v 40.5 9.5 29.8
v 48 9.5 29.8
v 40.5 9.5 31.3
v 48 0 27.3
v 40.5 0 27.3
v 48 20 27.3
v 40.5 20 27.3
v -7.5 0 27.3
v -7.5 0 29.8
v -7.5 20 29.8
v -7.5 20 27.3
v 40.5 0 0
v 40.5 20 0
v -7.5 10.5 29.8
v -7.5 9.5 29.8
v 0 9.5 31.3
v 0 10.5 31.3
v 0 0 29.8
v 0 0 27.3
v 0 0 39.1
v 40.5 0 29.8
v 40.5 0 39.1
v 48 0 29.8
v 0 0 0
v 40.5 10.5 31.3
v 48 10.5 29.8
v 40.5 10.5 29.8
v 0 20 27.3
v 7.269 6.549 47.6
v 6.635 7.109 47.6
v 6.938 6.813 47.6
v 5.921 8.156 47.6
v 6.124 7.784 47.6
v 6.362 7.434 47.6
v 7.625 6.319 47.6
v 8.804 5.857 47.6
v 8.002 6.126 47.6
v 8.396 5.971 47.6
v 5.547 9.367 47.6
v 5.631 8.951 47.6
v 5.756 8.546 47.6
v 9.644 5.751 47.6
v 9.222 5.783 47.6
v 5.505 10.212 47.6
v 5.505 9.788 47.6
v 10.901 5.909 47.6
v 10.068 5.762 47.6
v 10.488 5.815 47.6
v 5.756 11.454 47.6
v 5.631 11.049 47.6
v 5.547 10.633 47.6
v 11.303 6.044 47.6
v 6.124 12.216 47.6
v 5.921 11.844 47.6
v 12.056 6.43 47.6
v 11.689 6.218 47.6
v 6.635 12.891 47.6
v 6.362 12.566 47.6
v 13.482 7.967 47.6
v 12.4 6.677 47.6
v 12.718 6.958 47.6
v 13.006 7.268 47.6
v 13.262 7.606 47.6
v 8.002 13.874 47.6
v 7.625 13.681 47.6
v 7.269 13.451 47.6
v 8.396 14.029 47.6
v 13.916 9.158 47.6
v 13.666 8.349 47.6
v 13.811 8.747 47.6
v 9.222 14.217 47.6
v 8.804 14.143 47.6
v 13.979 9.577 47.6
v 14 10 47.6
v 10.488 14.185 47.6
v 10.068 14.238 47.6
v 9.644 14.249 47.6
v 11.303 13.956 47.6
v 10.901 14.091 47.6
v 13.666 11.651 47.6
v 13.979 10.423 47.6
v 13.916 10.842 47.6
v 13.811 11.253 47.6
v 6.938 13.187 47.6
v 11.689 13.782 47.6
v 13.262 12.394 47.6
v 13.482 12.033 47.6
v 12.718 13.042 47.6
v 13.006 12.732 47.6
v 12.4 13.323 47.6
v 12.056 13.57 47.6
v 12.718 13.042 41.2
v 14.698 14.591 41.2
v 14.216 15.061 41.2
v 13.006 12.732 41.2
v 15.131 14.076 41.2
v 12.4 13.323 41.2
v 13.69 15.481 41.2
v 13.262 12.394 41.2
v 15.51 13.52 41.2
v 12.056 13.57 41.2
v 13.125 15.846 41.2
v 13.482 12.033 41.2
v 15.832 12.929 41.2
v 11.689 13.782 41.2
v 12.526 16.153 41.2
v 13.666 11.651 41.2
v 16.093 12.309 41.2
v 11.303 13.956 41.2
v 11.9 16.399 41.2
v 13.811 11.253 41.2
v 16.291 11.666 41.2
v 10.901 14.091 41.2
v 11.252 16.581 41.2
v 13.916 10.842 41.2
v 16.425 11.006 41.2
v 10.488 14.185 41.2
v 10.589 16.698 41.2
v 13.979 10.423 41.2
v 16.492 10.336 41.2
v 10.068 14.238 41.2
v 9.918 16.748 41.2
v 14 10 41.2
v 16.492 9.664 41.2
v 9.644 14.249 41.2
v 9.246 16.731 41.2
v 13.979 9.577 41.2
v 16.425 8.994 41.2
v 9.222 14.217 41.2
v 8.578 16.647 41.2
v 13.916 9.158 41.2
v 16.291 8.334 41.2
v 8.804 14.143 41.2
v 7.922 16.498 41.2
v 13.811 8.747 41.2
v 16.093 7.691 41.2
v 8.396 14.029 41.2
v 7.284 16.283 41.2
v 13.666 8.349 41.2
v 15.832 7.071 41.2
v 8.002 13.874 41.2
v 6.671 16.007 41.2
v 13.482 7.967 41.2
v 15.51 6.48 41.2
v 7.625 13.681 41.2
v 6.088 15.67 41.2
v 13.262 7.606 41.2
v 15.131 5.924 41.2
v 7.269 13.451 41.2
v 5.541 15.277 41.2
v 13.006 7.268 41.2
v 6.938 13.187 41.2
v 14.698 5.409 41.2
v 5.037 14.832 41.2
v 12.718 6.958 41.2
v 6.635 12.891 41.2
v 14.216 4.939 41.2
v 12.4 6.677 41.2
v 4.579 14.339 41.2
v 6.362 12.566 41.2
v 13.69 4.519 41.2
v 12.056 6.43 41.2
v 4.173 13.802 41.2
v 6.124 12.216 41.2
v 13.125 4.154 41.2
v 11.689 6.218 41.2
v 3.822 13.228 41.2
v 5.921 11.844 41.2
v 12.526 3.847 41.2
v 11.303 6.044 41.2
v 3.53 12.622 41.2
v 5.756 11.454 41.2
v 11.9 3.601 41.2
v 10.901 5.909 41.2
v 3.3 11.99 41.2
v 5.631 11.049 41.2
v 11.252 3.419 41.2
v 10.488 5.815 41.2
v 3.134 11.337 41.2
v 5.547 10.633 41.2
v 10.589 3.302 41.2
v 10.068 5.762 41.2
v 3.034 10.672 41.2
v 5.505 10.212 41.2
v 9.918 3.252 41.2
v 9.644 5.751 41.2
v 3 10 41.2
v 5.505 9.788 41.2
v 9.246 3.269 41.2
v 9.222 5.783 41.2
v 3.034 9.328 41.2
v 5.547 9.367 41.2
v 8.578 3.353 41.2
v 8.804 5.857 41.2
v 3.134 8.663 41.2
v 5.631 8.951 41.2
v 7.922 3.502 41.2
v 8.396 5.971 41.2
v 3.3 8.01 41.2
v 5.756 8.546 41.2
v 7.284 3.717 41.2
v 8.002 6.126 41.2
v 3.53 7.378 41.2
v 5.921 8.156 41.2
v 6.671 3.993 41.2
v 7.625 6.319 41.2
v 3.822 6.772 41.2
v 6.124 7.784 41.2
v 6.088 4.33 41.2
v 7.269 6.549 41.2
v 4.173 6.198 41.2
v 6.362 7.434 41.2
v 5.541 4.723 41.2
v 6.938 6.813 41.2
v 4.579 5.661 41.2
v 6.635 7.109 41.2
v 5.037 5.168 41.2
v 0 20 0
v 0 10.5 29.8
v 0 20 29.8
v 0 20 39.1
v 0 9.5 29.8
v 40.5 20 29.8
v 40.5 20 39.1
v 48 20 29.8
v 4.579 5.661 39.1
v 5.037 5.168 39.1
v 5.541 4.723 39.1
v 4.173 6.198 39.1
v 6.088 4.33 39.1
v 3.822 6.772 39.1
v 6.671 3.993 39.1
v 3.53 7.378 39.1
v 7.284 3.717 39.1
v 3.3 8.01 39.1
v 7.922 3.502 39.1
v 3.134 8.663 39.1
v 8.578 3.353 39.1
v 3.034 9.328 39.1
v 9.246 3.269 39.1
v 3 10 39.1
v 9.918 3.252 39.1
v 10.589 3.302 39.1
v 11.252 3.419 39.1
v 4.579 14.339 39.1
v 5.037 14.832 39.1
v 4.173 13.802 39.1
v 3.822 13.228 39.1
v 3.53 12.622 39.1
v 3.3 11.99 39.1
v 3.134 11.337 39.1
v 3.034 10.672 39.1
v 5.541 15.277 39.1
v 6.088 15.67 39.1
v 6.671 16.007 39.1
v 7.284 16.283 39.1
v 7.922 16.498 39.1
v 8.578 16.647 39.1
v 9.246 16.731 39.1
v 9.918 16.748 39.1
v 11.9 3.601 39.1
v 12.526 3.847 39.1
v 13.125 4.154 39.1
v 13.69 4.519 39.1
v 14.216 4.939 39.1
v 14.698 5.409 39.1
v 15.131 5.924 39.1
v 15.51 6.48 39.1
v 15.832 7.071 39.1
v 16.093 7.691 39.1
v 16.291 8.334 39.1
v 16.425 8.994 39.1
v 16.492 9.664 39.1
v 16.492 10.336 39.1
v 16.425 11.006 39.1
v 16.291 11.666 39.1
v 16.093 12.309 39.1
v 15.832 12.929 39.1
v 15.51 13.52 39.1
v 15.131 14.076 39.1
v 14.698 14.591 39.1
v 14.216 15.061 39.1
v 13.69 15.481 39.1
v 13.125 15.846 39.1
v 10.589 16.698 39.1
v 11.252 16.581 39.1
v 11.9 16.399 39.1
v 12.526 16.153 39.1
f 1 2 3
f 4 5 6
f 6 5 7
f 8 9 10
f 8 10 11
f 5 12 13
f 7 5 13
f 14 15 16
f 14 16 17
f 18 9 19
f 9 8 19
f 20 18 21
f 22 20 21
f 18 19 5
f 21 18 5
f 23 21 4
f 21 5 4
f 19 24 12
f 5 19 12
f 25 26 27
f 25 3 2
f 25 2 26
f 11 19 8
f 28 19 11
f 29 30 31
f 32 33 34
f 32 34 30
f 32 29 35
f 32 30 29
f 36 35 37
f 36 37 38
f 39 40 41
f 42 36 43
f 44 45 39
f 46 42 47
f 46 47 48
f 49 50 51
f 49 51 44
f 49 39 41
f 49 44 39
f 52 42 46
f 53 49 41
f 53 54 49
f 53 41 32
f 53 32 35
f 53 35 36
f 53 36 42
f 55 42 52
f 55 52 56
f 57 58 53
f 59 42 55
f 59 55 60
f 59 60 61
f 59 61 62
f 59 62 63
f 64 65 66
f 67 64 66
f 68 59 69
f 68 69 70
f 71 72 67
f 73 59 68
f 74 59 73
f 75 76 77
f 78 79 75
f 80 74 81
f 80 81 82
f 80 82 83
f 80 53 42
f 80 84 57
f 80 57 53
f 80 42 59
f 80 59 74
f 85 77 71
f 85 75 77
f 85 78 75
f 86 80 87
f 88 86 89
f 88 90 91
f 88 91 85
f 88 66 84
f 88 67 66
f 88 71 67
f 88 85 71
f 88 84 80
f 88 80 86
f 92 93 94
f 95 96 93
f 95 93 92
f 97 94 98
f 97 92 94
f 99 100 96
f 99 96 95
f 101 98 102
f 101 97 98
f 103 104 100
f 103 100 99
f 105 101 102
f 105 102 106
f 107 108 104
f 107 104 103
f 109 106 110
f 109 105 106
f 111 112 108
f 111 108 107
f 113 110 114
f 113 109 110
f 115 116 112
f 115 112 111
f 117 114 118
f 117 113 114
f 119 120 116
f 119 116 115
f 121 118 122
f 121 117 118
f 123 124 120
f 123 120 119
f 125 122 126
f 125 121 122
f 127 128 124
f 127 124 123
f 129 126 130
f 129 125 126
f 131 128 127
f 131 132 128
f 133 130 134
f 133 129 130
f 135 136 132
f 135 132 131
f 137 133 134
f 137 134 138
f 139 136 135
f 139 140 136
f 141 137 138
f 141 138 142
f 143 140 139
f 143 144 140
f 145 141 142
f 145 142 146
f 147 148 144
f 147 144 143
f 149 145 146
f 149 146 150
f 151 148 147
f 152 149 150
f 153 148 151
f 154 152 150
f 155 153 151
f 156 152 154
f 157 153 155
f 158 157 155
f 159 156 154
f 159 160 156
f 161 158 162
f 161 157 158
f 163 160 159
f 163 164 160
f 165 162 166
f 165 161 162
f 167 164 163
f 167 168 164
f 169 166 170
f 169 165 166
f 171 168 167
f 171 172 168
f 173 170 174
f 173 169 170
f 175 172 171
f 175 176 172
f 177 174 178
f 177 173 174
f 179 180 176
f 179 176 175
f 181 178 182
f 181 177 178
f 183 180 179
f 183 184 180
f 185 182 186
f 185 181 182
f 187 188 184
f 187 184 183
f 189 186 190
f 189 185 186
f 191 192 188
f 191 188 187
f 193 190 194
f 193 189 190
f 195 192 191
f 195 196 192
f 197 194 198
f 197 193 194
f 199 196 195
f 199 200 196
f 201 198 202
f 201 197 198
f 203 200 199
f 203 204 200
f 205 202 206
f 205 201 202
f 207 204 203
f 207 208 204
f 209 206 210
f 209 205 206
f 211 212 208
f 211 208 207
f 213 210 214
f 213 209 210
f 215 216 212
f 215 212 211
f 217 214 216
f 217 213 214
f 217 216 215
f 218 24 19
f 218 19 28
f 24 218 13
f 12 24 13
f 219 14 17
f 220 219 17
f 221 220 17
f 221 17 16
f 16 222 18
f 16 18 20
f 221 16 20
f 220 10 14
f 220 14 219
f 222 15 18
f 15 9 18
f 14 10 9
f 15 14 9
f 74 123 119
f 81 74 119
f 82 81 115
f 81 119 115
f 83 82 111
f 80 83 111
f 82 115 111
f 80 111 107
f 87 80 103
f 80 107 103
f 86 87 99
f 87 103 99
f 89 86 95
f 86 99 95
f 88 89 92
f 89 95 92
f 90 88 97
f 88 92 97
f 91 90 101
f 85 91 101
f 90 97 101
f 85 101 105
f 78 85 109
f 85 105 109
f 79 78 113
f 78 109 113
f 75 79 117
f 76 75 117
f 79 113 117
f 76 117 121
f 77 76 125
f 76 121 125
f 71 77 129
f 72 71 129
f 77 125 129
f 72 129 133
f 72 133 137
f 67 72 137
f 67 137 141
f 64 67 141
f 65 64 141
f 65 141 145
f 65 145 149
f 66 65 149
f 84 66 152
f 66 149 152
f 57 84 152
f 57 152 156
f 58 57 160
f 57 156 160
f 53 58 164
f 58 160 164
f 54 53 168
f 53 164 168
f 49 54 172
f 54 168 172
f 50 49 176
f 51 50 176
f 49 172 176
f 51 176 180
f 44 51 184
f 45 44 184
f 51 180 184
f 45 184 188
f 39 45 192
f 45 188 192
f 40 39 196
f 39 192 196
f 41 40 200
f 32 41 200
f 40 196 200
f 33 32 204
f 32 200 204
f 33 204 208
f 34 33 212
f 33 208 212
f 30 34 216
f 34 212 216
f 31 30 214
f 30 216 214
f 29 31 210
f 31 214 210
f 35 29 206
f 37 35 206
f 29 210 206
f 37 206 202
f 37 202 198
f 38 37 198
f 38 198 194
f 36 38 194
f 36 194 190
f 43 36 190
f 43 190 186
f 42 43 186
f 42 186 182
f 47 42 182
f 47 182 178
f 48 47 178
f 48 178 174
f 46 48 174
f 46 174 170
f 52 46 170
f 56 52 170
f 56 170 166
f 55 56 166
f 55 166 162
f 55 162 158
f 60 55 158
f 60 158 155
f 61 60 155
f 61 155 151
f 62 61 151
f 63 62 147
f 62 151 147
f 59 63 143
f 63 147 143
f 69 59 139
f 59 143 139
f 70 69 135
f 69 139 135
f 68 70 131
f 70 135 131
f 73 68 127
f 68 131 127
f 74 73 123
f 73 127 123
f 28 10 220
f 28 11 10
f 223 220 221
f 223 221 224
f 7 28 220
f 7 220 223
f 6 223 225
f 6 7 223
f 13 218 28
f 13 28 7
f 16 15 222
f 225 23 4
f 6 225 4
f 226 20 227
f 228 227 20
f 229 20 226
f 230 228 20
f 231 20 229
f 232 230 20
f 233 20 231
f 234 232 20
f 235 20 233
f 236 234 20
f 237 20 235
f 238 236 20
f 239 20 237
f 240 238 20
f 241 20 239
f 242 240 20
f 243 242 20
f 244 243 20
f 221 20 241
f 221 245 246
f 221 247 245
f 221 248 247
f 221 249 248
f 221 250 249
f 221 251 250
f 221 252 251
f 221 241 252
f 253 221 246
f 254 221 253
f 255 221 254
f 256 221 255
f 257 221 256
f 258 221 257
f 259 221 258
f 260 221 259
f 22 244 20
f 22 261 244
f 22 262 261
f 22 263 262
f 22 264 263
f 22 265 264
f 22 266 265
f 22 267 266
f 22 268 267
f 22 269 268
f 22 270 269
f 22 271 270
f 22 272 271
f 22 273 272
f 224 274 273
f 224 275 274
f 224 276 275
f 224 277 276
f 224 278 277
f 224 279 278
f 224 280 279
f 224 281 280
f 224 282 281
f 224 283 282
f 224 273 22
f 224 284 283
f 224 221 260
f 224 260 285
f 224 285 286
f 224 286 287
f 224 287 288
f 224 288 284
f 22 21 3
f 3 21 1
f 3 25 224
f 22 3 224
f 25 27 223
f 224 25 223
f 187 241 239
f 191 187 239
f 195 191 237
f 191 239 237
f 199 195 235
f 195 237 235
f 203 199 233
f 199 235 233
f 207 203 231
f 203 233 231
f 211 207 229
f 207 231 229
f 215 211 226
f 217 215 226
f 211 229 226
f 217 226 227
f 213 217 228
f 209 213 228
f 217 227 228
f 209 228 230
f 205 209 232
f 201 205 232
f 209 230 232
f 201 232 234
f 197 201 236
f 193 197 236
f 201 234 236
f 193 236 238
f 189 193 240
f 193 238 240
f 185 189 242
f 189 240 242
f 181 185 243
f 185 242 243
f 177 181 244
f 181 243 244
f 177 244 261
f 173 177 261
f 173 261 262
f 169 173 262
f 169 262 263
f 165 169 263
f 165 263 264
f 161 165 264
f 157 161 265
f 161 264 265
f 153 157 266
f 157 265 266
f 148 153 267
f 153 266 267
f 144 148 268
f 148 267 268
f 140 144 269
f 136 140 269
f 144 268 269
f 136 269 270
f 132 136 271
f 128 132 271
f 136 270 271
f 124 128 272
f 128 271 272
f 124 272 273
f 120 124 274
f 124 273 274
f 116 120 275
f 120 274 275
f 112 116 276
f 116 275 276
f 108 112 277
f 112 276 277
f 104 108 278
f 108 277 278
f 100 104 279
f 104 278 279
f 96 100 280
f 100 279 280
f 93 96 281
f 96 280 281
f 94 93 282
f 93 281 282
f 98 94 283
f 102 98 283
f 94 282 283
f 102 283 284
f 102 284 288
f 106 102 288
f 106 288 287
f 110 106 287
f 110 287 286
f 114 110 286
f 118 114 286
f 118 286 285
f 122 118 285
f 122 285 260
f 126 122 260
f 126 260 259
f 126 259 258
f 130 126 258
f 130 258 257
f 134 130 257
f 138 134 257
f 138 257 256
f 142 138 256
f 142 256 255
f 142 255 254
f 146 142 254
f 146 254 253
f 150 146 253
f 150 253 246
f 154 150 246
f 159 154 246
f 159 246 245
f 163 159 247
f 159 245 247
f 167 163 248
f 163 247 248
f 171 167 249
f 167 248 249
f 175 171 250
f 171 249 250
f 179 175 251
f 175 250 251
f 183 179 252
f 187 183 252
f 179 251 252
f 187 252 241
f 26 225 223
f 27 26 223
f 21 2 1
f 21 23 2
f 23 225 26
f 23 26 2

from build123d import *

# Parameters (mm, degrees)
SKETCH1_W             = 40.5
SKETCH1_H             = 20
BOSS_EXTRUDE1_DEPTH   = 39.1
SKETCH2_R             = 6.75
BOSS_EXTRUDE2_DEPTH   = 2.1
SKETCH3_R             = 4.25
BOSS_EXTRUDE3_DEPTH   = 6.4
SKETCH4_W             = 2.5
SKETCH4_H             = 20
BOSS_EXTRUDE4_DEPTH   = 7.5
CHAMFER1_SIZE2        = 7.5
CHAMFER1_SIZE         = 1.5
CUT_EXTRUDE1_DEPTH    = 9.5
CHAMFER2_SIZE2        = 7.5
CHAMFER2_SIZE         = 1.5
MIRROR19_COPY_1_DEPTH = 9.5


with BuildPart() as part:
    # Sketch1 → Boss-Extrude1 (new body)
    with BuildSketch(Plane.XY):
        with Locations((20.25, 10)):
            Rectangle(SKETCH1_W, SKETCH1_H)
    extrude(amount=BOSS_EXTRUDE1_DEPTH)

    # Sketch2 → Boss-Extrude2 (add)
    with BuildSketch(Plane.XY.offset(39.1)):
        with Locations(Location((9.75, 10, 0), (0, 0, 180))):
            Circle(SKETCH2_R)
    extrude(amount=BOSS_EXTRUDE2_DEPTH)

    # Sketch3 → Boss-Extrude3 (add)
    with BuildSketch(Plane.XY.offset(41.2)):
        with Locations((9.75, 10)):
            Circle(SKETCH3_R)
    extrude(amount=BOSS_EXTRUDE3_DEPTH)

    # Sketch4 → Boss-Extrude4 (add)
    with BuildSketch(Plane(origin=(40.5, 0, 0), x_dir=(0, 0, -1), z_dir=(1, 0, 0))):
        with Locations((-28.55, 10)):
            Rectangle(SKETCH4_W, SKETCH4_H)
    boss_extrude4 = extrude(amount=BOSS_EXTRUDE4_DEPTH)

    # Chamfer1
    chamfer1_edges = [part.edges().sort_by_distance(p)[0] for p in [
        (40.5, 10, 29.8),
    ]]
    chamfer1_side = [part.faces().sort_by_distance(p)[0] for p in [
        (40.5, 10, 29.83),
    ]]
    chamfer(chamfer1_edges, length=CHAMFER1_SIZE - 0.0001, length2=CHAMFER1_SIZE2 - 0.0001, reference=chamfer1_side[0])  # a hair under: the kernel refuses the full size

    # Sketch5 → Cut-Extrude1 (cut)
    with BuildSketch(Plane.XZ):
        Polygon((48, 29.8), (40.5, 29.8), (40.5, 31.3), align=None)
    cut_extrude1 = extrude(amount=-CUT_EXTRUDE1_DEPTH, mode=Mode.SUBTRACT)

    # Mirror1: Cut-Extrude1 across plane
    add(cut_extrude1.mirror(Plane.ZX.offset(10)), mode=Mode.SUBTRACT)

    # Mirror11: Boss-Extrude4 across plane
    add(boss_extrude4.mirror(Plane(origin=(20.25, 0, 0), x_dir=(0, 0, 1), z_dir=(1, 0, 0))))

    # Chamfer2
    chamfer2_edges = [part.edges().sort_by_distance(p)[0] for p in [
        (0, 10, 29.8),
    ]]
    chamfer2_side = [part.faces().sort_by_distance(p)[0] for p in [
        (0, 10, 29.83),
    ]]
    chamfer(chamfer2_edges, length=CHAMFER2_SIZE - 0.0001, length2=CHAMFER2_SIZE2 - 0.0001, reference=chamfer2_side[0])  # a hair under: the kernel refuses the full size

    # Mirror19: Cut-Extrude1 across plane
    add(cut_extrude1.mirror(Plane(origin=(20.25, 0, 0), x_dir=(0, 0, 1), z_dir=(1, 0, 0))), mode=Mode.SUBTRACT)

    # Mirror19 copy 1 sketch → Mirror19 copy 1 (cut)
    with BuildSketch(Plane(origin=(40.5, 20, 0), x_dir=(-1, 0, 0), z_dir=(0, 1, 0))):
        Polygon((48, 29.8), (40.5, 29.8), (40.5, 31.3), align=None)
    extrude(amount=-MIRROR19_COPY_1_DEPTH, mode=Mode.SUBTRACT)


solid = part.part
